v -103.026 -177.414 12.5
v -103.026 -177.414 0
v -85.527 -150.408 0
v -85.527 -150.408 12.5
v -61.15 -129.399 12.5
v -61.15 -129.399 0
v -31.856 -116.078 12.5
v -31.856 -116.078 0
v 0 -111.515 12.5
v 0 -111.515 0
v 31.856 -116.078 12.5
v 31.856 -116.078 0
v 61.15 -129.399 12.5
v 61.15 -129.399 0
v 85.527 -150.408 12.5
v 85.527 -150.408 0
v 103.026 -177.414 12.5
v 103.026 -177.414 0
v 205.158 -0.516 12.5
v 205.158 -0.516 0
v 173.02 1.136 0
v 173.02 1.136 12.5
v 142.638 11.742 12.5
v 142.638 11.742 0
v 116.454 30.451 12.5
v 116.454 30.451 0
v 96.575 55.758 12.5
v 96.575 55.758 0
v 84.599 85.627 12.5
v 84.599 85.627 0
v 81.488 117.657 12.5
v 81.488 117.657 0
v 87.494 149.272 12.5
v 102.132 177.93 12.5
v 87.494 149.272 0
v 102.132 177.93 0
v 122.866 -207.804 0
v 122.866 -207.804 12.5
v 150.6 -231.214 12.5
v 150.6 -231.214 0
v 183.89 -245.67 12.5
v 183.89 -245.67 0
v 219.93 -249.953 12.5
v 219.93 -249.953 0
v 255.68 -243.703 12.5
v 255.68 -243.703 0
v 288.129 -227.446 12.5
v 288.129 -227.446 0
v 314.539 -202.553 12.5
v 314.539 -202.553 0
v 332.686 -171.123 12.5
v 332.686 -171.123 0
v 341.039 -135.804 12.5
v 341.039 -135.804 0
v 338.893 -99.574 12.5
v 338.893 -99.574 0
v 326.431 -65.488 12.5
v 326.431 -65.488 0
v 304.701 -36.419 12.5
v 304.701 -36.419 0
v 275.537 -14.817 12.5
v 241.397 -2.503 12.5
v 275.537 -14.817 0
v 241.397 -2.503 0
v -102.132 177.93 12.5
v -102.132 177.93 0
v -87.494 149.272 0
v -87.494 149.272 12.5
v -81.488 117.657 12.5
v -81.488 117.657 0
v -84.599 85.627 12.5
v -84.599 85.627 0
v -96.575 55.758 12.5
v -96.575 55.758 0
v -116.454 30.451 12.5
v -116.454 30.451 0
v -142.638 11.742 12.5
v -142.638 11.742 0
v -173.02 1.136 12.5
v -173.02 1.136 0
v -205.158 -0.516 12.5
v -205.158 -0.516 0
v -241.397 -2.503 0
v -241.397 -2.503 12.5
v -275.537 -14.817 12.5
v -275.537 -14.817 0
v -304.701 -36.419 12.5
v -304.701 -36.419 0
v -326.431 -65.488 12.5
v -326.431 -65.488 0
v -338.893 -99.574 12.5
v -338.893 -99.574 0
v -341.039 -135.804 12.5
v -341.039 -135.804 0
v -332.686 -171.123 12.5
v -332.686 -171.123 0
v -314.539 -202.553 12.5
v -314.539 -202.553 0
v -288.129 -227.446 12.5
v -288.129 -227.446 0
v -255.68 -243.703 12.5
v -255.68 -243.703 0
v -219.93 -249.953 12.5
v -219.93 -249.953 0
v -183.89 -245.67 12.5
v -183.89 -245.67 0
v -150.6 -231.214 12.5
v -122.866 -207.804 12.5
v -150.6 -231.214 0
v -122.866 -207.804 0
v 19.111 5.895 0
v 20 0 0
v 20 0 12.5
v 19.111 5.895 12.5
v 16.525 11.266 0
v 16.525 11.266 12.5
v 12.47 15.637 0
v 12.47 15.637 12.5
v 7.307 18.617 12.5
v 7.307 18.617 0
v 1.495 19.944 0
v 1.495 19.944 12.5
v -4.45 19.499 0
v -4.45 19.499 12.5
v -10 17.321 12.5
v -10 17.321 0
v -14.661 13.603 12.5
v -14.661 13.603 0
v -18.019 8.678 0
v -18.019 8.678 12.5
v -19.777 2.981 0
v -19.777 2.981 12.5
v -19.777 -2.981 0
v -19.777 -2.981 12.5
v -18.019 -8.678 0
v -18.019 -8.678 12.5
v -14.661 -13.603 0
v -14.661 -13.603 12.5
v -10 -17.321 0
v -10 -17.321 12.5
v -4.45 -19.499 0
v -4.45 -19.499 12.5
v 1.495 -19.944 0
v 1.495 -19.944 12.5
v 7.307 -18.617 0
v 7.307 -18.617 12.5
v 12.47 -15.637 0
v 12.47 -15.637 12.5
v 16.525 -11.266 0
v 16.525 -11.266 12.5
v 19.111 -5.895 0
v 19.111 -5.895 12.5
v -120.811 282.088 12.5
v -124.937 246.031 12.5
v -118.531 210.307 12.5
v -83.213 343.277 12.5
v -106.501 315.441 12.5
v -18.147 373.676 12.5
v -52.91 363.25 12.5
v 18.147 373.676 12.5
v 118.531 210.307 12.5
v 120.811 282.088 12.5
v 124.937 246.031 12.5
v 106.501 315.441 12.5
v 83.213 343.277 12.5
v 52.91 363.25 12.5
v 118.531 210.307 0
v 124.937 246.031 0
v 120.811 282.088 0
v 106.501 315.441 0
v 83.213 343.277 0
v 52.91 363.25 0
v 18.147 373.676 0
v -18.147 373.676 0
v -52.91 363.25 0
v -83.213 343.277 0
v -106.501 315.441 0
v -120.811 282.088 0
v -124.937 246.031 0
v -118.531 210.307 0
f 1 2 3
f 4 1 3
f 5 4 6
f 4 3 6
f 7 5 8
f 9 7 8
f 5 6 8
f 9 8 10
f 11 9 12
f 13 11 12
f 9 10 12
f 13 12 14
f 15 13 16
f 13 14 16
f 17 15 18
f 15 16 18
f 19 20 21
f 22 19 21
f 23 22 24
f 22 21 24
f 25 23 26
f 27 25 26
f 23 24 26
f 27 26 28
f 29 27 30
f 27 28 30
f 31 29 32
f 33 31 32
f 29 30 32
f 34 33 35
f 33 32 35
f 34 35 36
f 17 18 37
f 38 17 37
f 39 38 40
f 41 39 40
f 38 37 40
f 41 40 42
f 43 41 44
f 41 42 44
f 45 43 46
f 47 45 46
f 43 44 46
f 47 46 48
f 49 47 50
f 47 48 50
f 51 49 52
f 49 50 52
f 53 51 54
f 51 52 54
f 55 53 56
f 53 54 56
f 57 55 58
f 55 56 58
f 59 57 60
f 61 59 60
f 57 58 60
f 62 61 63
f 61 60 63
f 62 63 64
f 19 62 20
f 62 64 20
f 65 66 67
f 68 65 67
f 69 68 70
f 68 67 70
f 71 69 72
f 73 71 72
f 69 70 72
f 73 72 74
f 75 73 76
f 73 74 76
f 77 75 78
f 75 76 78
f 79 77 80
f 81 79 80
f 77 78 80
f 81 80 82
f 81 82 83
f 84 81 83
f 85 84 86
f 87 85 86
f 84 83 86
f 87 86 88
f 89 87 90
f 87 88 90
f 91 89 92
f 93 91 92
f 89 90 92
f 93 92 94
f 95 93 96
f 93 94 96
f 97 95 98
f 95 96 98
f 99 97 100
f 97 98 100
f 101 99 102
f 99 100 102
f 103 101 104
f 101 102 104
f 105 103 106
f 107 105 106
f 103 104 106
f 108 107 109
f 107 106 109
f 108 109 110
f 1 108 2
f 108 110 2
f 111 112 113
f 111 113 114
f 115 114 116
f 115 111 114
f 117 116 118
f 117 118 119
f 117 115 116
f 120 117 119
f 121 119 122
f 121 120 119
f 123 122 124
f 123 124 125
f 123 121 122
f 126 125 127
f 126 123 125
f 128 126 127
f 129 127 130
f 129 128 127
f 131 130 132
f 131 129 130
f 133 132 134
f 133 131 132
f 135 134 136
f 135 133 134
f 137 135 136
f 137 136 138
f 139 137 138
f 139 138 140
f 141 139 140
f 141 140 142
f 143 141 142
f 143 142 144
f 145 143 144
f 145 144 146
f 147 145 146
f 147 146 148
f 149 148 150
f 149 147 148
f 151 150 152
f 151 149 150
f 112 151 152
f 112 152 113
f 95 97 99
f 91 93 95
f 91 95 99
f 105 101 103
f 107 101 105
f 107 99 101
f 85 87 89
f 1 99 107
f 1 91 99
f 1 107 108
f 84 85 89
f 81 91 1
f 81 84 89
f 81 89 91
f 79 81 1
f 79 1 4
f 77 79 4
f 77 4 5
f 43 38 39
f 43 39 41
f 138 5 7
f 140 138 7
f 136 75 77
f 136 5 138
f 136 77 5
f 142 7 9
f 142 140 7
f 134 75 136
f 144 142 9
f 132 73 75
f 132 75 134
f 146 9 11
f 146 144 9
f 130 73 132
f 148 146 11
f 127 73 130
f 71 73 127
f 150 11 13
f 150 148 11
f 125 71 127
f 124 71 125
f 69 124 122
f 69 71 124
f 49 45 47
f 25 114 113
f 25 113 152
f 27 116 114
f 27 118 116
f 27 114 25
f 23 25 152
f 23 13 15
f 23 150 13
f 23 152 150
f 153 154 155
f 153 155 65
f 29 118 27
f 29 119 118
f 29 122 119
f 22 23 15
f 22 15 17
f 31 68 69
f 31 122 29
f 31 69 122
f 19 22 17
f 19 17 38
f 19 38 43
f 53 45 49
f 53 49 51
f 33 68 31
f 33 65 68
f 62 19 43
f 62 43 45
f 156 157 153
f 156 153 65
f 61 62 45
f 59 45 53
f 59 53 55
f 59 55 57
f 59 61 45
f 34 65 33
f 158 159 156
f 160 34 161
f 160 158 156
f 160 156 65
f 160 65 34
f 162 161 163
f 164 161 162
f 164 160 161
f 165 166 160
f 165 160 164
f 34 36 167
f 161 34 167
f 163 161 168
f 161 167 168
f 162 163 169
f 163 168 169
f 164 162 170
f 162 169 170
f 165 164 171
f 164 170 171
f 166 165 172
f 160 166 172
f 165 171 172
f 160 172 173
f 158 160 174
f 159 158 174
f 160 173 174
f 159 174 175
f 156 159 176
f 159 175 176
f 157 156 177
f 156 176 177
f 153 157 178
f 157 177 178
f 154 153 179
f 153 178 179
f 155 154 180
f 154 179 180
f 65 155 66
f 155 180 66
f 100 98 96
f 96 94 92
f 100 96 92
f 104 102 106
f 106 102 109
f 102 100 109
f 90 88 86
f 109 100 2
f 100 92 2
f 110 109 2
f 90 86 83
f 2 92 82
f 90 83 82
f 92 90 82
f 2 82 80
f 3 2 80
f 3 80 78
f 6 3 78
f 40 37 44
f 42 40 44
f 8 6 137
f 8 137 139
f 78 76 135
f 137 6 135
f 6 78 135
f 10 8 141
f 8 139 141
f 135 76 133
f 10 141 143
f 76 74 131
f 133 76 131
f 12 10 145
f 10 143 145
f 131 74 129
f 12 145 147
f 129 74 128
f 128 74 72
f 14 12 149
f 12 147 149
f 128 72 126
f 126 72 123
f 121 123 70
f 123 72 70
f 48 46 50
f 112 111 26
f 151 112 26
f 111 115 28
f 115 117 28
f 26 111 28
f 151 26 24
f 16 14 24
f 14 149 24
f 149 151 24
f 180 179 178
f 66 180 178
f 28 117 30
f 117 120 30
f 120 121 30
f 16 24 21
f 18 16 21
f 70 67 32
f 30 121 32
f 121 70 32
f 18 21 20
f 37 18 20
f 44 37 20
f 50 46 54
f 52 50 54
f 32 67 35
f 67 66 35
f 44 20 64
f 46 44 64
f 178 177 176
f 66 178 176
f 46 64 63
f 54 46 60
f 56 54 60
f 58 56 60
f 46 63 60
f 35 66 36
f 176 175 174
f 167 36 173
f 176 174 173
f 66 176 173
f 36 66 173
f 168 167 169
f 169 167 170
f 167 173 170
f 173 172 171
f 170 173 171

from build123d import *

# Parameters (mm, degrees)
F0_R     = 100
F0_R_2   = 20
F1_DEPTH = 12.5


with BuildPart() as f1:
    # F0 (on Top) → F1 (new body)
    with BuildSketch(Plane.XY):
        with BuildLine():
            ThreePointArc((205.158335, -0.516176), (96.574996, 55.7576), (102.132146, 177.930417))
            ThreePointArc((102.132146, 177.930417), (0, 375), (-102.132146, 177.930417))
            ThreePointArc((-102.132146, 177.930417), (-96.574996, 55.7576), (-205.158335, -0.516176))
            ThreePointArc((-205.158335, -0.516176), (-324.759526, -187.5), (-103.026189, -177.414242))
            ThreePointArc((-103.026189, -177.414242), (0, -111.5152), (103.026189, -177.414242))
            ThreePointArc((103.026189, -177.414242), (324.759526, -187.5), (205.158335, -0.516176))
        make_face()
        Circle(F0_R, mode=Mode.SUBTRACT)
        Circle(F0_R)
        Circle(F0_R_2, mode=Mode.SUBTRACT)
    extrude(amount=F1_DEPTH)


solid = f1.part
